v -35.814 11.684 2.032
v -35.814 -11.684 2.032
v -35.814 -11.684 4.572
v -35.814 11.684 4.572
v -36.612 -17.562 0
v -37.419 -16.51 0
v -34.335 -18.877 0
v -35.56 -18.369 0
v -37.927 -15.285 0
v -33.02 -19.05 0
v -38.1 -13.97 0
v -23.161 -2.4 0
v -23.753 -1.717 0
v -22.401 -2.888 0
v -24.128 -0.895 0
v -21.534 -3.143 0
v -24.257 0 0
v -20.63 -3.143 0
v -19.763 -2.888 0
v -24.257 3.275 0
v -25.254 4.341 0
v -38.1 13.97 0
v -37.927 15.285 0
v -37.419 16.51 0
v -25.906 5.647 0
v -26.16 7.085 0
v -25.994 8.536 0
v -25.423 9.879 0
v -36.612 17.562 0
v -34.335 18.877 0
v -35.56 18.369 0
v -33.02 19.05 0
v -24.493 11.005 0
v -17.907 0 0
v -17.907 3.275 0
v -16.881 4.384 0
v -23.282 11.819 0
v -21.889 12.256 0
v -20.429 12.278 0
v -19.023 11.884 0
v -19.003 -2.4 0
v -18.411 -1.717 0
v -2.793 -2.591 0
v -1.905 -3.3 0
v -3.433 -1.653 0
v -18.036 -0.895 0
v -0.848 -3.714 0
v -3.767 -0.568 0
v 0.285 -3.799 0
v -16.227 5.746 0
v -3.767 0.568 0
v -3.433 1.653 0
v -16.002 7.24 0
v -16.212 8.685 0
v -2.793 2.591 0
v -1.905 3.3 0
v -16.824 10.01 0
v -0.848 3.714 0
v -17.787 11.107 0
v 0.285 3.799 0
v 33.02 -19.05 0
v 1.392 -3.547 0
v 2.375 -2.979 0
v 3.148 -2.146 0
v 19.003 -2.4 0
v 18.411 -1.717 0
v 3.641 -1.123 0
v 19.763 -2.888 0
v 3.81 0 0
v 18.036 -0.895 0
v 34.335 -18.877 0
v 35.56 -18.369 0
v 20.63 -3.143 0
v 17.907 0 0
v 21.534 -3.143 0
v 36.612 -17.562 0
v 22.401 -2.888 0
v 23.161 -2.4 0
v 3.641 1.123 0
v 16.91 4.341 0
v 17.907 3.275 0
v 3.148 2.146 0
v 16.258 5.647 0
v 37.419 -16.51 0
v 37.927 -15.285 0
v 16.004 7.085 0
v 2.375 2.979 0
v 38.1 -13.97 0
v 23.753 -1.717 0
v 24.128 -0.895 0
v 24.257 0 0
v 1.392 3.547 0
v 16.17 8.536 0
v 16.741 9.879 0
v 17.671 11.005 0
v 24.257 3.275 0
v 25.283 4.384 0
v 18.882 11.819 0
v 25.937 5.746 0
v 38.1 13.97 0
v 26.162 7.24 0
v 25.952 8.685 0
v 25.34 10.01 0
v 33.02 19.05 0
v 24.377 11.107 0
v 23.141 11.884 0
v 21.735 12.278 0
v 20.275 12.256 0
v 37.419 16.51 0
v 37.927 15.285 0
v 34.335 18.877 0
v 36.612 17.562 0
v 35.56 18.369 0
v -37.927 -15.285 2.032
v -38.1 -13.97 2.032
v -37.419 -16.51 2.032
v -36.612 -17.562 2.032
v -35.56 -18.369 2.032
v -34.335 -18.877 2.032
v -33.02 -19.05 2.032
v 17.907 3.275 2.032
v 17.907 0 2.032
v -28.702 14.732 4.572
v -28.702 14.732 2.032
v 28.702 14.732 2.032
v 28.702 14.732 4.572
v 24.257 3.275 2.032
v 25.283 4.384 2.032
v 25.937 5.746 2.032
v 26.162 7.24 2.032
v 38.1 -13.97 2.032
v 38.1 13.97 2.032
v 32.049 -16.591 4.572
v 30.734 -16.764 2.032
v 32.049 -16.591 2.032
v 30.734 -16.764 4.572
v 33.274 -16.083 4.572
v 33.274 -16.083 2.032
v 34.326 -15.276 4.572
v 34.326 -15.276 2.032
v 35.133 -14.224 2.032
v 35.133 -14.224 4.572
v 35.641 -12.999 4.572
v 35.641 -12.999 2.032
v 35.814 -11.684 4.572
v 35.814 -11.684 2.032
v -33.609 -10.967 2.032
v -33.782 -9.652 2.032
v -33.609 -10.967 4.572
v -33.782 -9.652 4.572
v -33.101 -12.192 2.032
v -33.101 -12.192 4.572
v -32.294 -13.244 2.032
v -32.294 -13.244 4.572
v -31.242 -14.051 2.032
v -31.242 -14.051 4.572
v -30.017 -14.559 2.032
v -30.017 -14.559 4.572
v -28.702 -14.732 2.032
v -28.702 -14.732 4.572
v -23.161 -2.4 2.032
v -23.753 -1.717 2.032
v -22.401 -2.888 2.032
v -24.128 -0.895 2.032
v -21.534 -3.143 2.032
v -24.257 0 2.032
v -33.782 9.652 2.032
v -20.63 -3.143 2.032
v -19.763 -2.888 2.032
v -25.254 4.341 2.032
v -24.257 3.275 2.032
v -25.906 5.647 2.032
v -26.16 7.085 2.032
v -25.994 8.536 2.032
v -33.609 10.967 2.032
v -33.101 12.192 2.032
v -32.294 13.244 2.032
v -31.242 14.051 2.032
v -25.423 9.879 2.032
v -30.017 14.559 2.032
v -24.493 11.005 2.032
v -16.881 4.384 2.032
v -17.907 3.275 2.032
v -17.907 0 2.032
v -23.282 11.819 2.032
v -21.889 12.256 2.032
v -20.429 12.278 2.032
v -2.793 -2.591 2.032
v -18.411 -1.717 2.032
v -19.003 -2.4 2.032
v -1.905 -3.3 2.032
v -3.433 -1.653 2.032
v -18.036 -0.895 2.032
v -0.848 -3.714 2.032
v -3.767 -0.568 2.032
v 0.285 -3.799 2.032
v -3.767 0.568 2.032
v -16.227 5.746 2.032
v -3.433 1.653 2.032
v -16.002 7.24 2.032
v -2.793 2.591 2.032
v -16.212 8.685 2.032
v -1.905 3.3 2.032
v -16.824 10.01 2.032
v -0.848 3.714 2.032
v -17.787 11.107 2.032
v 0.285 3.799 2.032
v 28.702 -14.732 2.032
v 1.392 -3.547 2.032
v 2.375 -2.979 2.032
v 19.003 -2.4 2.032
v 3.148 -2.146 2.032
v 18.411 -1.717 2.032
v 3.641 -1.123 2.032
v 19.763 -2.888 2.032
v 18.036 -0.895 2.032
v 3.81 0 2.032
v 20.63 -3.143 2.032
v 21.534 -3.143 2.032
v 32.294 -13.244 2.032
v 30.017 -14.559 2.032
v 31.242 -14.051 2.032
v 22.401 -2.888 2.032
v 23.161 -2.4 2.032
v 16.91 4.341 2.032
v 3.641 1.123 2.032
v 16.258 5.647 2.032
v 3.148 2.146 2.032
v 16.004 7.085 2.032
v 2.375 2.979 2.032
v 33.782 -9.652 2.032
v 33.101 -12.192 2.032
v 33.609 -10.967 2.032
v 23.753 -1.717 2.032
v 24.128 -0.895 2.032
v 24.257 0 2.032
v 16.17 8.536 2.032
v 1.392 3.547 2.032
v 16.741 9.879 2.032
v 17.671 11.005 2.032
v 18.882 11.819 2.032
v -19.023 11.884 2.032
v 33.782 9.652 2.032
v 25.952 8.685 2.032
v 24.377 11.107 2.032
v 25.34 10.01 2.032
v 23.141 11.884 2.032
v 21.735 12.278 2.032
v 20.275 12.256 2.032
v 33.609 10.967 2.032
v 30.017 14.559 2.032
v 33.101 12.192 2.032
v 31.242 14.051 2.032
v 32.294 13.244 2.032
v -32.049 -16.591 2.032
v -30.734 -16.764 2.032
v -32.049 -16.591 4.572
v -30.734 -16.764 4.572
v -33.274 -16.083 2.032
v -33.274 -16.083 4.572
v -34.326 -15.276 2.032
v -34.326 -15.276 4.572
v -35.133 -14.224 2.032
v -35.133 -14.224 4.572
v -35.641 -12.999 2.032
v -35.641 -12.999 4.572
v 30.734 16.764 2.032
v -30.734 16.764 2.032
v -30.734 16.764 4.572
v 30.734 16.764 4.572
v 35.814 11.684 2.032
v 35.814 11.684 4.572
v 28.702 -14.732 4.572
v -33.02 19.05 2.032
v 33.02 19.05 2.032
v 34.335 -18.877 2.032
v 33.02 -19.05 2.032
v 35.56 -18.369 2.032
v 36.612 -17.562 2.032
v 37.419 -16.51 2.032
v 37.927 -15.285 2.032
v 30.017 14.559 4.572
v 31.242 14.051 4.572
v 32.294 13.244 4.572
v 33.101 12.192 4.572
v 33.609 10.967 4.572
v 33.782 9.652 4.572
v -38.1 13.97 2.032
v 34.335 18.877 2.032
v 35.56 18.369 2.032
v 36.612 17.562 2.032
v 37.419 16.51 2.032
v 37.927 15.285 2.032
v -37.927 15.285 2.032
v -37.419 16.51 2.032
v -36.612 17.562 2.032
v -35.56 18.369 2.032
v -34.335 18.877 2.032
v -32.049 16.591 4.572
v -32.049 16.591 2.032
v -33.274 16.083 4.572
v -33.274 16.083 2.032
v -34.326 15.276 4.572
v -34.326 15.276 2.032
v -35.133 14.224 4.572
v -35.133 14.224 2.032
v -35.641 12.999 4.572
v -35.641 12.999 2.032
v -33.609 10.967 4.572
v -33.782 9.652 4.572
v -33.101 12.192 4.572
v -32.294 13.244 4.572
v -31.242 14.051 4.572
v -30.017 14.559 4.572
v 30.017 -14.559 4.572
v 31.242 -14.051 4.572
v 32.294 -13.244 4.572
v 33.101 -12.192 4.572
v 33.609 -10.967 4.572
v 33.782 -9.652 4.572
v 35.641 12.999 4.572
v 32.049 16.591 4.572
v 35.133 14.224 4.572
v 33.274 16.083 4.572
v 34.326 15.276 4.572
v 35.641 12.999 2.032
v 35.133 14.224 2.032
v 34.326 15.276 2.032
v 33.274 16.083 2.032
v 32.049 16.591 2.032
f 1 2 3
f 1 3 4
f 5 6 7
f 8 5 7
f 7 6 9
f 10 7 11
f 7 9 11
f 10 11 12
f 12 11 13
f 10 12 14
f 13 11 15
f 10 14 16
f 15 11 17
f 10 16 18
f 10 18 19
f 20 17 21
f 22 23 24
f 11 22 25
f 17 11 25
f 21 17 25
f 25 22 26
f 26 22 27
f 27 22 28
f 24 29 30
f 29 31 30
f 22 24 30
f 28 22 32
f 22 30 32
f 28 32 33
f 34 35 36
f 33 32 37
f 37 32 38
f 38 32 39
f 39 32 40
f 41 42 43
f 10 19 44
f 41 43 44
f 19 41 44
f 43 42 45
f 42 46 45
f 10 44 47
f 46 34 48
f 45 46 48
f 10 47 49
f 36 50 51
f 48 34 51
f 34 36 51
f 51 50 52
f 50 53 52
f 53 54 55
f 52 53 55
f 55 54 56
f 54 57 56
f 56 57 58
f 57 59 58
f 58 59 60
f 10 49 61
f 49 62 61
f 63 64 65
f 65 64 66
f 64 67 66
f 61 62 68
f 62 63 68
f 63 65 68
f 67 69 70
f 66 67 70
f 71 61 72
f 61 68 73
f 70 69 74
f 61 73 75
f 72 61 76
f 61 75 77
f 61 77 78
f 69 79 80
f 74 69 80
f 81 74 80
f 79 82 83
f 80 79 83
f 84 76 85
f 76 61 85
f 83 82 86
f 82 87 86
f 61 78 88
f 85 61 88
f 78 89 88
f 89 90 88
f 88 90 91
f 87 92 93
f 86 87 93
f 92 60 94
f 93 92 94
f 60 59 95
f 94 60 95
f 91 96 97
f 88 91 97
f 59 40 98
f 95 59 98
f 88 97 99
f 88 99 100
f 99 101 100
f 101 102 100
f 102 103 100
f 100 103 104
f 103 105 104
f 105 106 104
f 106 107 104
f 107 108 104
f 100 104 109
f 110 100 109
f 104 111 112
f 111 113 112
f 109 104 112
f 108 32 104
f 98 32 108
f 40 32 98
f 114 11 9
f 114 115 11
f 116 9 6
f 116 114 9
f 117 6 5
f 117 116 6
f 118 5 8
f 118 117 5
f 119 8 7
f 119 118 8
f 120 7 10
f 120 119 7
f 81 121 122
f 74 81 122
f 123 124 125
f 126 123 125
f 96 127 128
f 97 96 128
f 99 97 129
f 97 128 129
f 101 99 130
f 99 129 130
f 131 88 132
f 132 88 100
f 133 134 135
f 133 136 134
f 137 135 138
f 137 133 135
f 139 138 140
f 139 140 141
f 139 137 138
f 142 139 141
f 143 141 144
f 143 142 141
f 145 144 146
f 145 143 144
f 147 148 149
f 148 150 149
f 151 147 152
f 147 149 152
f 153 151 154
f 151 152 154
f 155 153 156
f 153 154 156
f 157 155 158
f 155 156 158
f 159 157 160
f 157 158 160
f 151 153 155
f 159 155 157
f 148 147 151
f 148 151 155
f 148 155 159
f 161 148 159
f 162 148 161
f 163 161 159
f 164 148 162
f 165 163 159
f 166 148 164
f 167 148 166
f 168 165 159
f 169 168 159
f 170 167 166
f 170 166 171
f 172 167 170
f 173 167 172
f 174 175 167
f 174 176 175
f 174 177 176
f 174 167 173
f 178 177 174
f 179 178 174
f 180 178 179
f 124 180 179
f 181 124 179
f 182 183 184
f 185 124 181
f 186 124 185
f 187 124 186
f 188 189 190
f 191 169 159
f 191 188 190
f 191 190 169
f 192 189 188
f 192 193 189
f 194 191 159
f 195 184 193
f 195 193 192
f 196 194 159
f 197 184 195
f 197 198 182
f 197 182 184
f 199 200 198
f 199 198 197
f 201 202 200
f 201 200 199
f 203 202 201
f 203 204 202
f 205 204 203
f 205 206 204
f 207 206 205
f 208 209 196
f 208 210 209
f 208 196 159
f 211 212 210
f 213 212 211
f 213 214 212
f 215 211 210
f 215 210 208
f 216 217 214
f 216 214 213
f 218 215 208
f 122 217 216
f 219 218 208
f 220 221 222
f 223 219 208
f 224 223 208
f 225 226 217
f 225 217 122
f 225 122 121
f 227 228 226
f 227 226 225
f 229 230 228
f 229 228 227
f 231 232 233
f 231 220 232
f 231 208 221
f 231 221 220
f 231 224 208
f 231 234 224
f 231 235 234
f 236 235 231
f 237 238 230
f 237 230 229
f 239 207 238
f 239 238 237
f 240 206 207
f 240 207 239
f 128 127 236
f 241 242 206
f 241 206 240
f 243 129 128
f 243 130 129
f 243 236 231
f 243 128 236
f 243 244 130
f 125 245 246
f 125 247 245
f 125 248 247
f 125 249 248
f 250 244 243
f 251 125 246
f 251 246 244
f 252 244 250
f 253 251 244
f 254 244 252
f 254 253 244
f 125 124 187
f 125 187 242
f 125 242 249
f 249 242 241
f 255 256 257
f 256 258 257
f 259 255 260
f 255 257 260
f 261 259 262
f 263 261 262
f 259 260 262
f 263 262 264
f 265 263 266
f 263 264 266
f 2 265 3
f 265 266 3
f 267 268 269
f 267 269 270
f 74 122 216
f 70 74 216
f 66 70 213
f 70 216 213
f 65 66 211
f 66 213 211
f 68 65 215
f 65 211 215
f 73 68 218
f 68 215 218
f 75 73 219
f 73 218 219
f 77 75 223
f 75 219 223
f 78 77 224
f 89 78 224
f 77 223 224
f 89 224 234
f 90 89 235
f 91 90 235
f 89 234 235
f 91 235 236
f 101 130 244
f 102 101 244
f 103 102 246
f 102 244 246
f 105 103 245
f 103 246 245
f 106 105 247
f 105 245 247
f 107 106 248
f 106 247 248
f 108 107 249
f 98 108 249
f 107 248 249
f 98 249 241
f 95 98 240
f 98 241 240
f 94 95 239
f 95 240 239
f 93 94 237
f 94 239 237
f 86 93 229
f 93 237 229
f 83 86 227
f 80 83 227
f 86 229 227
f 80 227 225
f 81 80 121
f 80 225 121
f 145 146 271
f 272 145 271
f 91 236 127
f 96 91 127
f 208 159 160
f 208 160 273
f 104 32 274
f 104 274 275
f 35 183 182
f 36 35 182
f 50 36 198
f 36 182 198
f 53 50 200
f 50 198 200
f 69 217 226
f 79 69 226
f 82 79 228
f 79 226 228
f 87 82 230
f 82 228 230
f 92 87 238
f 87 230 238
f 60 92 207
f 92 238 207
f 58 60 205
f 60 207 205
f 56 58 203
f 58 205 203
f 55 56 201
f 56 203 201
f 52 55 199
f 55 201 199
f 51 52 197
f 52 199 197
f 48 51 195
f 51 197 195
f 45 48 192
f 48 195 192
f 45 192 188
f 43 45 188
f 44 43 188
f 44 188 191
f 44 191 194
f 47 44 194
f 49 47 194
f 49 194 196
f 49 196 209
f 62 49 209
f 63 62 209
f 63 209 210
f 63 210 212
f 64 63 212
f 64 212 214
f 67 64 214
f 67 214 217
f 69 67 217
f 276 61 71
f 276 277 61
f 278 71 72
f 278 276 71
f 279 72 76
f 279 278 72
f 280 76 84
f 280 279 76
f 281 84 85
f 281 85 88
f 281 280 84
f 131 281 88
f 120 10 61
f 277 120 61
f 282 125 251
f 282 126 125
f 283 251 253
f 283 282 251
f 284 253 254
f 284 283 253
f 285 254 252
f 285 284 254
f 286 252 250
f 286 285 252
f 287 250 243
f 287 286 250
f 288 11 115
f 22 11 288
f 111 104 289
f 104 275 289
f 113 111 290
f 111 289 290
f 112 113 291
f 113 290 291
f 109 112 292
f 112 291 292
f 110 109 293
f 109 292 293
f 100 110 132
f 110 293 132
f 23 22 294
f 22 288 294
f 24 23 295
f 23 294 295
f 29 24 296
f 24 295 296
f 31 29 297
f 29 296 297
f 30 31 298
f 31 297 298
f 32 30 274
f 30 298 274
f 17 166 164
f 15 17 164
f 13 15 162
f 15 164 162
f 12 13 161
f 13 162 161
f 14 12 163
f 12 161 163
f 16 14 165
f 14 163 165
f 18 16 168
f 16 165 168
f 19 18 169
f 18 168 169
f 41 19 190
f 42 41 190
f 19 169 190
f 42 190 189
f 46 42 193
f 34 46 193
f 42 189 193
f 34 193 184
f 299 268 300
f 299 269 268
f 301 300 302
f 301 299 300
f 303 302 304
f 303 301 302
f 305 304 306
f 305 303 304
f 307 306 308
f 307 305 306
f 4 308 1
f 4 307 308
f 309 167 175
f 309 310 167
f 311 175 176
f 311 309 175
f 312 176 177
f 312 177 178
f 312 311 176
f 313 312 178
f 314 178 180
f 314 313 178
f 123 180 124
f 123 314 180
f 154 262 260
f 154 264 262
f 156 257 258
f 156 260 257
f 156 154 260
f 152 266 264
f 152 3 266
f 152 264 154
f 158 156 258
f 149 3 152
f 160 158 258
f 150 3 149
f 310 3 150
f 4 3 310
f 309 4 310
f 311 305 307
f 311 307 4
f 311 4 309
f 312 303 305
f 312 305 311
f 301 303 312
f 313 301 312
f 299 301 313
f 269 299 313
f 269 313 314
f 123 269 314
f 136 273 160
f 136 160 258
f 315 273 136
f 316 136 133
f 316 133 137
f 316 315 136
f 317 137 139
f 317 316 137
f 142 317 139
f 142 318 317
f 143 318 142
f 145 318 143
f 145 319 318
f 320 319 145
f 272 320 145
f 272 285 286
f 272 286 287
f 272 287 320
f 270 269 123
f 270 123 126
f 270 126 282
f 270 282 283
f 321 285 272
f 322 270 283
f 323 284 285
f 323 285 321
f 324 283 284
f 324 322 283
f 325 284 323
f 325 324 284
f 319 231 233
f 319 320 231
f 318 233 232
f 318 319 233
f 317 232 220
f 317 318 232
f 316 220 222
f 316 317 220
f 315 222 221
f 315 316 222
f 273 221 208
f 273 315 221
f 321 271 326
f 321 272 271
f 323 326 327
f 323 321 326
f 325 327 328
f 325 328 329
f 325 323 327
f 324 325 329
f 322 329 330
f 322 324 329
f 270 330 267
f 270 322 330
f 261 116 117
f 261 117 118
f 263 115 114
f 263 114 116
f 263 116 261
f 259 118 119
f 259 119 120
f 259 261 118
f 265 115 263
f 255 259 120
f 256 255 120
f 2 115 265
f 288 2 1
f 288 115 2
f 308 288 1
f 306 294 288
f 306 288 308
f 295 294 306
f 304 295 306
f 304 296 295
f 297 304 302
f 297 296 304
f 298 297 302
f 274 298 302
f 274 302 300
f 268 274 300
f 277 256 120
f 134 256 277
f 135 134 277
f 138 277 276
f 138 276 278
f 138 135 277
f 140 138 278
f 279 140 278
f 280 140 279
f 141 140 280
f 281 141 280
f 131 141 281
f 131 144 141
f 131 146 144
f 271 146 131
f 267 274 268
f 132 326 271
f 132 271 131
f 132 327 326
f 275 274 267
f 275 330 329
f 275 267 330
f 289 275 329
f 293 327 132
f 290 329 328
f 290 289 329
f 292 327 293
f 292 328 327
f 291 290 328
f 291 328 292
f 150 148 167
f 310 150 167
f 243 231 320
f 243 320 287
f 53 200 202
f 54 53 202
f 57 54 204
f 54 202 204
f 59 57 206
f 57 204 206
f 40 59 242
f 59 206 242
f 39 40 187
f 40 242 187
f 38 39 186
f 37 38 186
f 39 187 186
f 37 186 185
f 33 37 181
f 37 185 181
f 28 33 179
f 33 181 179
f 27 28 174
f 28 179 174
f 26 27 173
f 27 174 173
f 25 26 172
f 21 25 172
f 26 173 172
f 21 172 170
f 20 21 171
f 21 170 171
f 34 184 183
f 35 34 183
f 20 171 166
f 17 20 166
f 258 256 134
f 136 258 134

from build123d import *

# Parameters (mm, degrees)
F0_W     = 76.2
F0_H     = 38.1
F1_DEPTH = 2.032
F2_R     = 3.81
F3_DEPTH = 25.4
F2_W     = 71.628
F2_H     = 33.528
F2_W_2   = 67.564
F2_H_2   = 29.464
F4_DEPTH = 2.54
F5_R     = 5.08
F7_DEPTH = 25.4
F8_DEPTH = 25.4


with BuildPart() as f1:
    # F0 (on Top) → F1 (new body)
    with BuildSketch(Plane.XY):
        Rectangle(F0_W, F0_H)
    extrude(amount=F1_DEPTH)

    # F2 (on face) → F3 (cut)
    with BuildSketch(Plane.XY.offset(2.032)):
        Circle(F2_R)
    extrude(amount=-F3_DEPTH, mode=Mode.SUBTRACT)

    # F2 (on face) → F4 (join)
    with BuildSketch(Plane.XY.offset(2.032)):
        Rectangle(F2_W, F2_H)
        Rectangle(F2_W_2, F2_H_2, mode=Mode.SUBTRACT)
    extrude(amount=F4_DEPTH)

    # F5
    f5_edges = [f1.edges().sort_by_distance(p)[0] for p in [
        (-33.782, 14.732, 3.302),
        (-33.782, -14.732, 3.302),
        (33.782, -14.732, 3.302),
        (33.782, 14.732, 3.302),
        (-35.814, -16.764, 3.302),
        (-38.1, -19.05, 1.016),
        (38.1, -19.05, 1.016),
        (35.814, -16.764, 3.302),
        (38.1, 19.05, 1.016),
        (35.814, 16.764, 3.302),
        (-35.814, 16.764, 3.302),
        (-38.1, 19.05, 1.016),
    ]]
    fillet(f5_edges, radius=F5_R)

    # F6 (on face) → F7 (cut)
    with BuildSketch(Plane.XY.offset(2.032)):
        with BuildLine():
            ThreePointArc((22.9948570038, 2.5340882153), (21.082, 3.175), (19.1691429962, 2.5340882153))
            ThreePointArc((19.1691429962, 2.5340882153), (21.082, 2.1601883081), (22.9948570038, 2.5340882153))
        make_face()
        with BuildLine():
            ThreePointArc((19.1691429962, 2.5340882153), (18.2399984177, 1.4155041527), (17.907, 0))
            ThreePointArc((17.907, 0), (21.082, -3.175), (24.257, 0))
            ThreePointArc((24.257, 0), (23.9240015823, 1.4155041527), (22.9948570038, 2.5340882153))
            ThreePointArc((22.9948570038, 2.5340882153), (21.082, 2.1601883081), (19.1691429962, 2.5340882153))
        make_face()
        with BuildLine():
            ThreePointArc((17.907, 3.2746145791), (18.511267216, 2.8586665458), (19.1691429962, 2.5340882153))
            ThreePointArc((19.1691429962, 2.5340882153), (21.082, 3.175), (22.9948570038, 2.5340882153))
            ThreePointArc((22.9948570038, 2.5340882153), (23.652732784, 2.8586665458), (24.257, 3.2746145791))
            ThreePointArc((24.257, 3.2746145791), (25.6610501198, 5.0404837824), (26.162, 7.2401883081))
            ThreePointArc((26.162, 7.2401883081), (18.8822954744, 11.8192384279), (17.907, 3.2746145791))
        make_face()
        with BuildLine():
            Line((17.907, 3.2746145791), (17.907, 0))
            ThreePointArc((17.907, 0), (18.2399984177, 1.4155041527), (19.1691429962, 2.5340882153))
            ThreePointArc((19.1691429962, 2.5340882153), (18.511267216, 2.8586665458), (17.907, 3.2746145791))
        make_face()
        with BuildLine():
            ThreePointArc((22.9948570038, 2.5340882153), (23.9240015823, 1.4155041527), (24.257, 0))
            Line((24.257, 0), (24.257, 3.2746145791))
            ThreePointArc((24.257, 3.2746145791), (23.652732784, 2.8586665458), (22.9948570038, 2.5340882153))
        make_face()
    extrude(amount=-F7_DEPTH, mode=Mode.SUBTRACT)

    # F6 (on face) → F8 (cut)
    with BuildSketch(Plane.XY.offset(2.032)):
        with BuildLine():
            ThreePointArc((-24.257, 3.2746145791), (-23.652732784, 2.8586665458), (-22.9948570038, 2.5340882153))
            ThreePointArc((-22.9948570038, 2.5340882153), (-21.082, 3.175), (-19.1691429962, 2.5340882153))
            ThreePointArc((-19.1691429962, 2.5340882153), (-18.511267216, 2.8586665458), (-17.907, 3.2746145791))
            ThreePointArc((-17.907, 3.2746145791), (-16.5029498802, 5.0404837824), (-16.002, 7.2401883081))
            ThreePointArc((-16.002, 7.2401883081), (-23.2817045256, 11.8192384279), (-24.257, 3.2746145791))
        make_face()
        with BuildLine():
            ThreePointArc((-22.9948570038, 2.5340882153), (-23.9240015823, 1.4155041527), (-24.257, 0))
            ThreePointArc((-24.257, 0), (-21.082, -3.175), (-17.907, 0))
            ThreePointArc((-17.907, 0), (-18.2399984177, 1.4155041527), (-19.1691429962, 2.5340882153))
            ThreePointArc((-19.1691429962, 2.5340882153), (-21.082, 2.1601883081), (-22.9948570038, 2.5340882153))
        make_face()
        with BuildLine():
            Line((-24.257, 3.2746145791), (-24.257, 0))
            ThreePointArc((-24.257, 0), (-23.9240015823, 1.4155041527), (-22.9948570038, 2.5340882153))
            ThreePointArc((-22.9948570038, 2.5340882153), (-23.652732784, 2.8586665458), (-24.257, 3.2746145791))
        make_face()
        with BuildLine():
            ThreePointArc((-19.1691429962, 2.5340882153), (-21.082, 3.175), (-22.9948570038, 2.5340882153))
            ThreePointArc((-22.9948570038, 2.5340882153), (-21.082, 2.1601883081), (-19.1691429962, 2.5340882153))
        make_face()
        with BuildLine():
            ThreePointArc((-19.1691429962, 2.5340882153), (-18.2399984177, 1.4155041527), (-17.907, 0))
            Line((-17.907, 0), (-17.907, 3.2746145791))
            ThreePointArc((-17.907, 3.2746145791), (-18.511267216, 2.8586665458), (-19.1691429962, 2.5340882153))
        make_face()
    extrude(amount=-F8_DEPTH, mode=Mode.SUBTRACT)


solid = f1.part
